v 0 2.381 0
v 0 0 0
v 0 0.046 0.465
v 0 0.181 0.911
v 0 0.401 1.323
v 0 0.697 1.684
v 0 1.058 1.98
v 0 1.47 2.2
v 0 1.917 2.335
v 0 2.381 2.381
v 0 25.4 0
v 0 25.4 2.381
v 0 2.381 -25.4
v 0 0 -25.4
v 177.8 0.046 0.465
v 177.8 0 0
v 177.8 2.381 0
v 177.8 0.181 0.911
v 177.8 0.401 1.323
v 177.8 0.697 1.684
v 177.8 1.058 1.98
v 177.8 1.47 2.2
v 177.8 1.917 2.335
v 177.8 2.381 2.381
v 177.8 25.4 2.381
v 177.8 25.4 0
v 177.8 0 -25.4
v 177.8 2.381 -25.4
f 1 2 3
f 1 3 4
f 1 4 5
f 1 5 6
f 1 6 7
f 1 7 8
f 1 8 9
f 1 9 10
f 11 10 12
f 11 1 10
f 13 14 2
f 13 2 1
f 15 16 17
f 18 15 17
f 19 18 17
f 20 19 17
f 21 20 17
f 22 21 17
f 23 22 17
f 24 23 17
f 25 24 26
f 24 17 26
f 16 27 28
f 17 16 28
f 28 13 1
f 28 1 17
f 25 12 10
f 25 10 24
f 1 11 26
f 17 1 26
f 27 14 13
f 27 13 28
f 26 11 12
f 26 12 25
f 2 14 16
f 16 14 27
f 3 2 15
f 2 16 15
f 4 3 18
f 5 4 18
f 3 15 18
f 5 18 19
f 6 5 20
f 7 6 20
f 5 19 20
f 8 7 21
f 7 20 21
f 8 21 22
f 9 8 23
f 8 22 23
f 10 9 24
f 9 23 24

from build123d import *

# Parameters (mm, degrees)
SKETCH1_W           = 177.8
SKETCH1_H           = 25.4
BOSS_EXTRUDE1_DEPTH = 2.38125
SKETCH2_W           = 177.8
SKETCH2_H           = 25.4
BOSS_EXTRUDE2_DEPTH = 2.38125
FILLET1_R           = 2.38125


with BuildPart() as part:
    # Sketch1 → Boss-Extrude1 (new body)
    with BuildSketch(Plane(origin=(0, 0, 0), x_dir=(1, 0, 0), z_dir=(0, 1, 0))):
        with Locations((88.9, 12.7)):
            Rectangle(SKETCH1_W, SKETCH1_H)
    extrude(amount=BOSS_EXTRUDE1_DEPTH)

    # Sketch2 → Boss-Extrude2 (add)
    with BuildSketch(Plane.XY):
        with Locations((88.9, 12.7)):
            Rectangle(SKETCH2_W, SKETCH2_H)
    extrude(amount=BOSS_EXTRUDE2_DEPTH)

    # Fillet1
    fillet1_edges = [part.edges().sort_by_distance(p)[0] for p in [
        (88.9, 0, 2.38125),
    ]]
    fillet(fillet1_edges, radius=FILLET1_R)


solid = part.part
